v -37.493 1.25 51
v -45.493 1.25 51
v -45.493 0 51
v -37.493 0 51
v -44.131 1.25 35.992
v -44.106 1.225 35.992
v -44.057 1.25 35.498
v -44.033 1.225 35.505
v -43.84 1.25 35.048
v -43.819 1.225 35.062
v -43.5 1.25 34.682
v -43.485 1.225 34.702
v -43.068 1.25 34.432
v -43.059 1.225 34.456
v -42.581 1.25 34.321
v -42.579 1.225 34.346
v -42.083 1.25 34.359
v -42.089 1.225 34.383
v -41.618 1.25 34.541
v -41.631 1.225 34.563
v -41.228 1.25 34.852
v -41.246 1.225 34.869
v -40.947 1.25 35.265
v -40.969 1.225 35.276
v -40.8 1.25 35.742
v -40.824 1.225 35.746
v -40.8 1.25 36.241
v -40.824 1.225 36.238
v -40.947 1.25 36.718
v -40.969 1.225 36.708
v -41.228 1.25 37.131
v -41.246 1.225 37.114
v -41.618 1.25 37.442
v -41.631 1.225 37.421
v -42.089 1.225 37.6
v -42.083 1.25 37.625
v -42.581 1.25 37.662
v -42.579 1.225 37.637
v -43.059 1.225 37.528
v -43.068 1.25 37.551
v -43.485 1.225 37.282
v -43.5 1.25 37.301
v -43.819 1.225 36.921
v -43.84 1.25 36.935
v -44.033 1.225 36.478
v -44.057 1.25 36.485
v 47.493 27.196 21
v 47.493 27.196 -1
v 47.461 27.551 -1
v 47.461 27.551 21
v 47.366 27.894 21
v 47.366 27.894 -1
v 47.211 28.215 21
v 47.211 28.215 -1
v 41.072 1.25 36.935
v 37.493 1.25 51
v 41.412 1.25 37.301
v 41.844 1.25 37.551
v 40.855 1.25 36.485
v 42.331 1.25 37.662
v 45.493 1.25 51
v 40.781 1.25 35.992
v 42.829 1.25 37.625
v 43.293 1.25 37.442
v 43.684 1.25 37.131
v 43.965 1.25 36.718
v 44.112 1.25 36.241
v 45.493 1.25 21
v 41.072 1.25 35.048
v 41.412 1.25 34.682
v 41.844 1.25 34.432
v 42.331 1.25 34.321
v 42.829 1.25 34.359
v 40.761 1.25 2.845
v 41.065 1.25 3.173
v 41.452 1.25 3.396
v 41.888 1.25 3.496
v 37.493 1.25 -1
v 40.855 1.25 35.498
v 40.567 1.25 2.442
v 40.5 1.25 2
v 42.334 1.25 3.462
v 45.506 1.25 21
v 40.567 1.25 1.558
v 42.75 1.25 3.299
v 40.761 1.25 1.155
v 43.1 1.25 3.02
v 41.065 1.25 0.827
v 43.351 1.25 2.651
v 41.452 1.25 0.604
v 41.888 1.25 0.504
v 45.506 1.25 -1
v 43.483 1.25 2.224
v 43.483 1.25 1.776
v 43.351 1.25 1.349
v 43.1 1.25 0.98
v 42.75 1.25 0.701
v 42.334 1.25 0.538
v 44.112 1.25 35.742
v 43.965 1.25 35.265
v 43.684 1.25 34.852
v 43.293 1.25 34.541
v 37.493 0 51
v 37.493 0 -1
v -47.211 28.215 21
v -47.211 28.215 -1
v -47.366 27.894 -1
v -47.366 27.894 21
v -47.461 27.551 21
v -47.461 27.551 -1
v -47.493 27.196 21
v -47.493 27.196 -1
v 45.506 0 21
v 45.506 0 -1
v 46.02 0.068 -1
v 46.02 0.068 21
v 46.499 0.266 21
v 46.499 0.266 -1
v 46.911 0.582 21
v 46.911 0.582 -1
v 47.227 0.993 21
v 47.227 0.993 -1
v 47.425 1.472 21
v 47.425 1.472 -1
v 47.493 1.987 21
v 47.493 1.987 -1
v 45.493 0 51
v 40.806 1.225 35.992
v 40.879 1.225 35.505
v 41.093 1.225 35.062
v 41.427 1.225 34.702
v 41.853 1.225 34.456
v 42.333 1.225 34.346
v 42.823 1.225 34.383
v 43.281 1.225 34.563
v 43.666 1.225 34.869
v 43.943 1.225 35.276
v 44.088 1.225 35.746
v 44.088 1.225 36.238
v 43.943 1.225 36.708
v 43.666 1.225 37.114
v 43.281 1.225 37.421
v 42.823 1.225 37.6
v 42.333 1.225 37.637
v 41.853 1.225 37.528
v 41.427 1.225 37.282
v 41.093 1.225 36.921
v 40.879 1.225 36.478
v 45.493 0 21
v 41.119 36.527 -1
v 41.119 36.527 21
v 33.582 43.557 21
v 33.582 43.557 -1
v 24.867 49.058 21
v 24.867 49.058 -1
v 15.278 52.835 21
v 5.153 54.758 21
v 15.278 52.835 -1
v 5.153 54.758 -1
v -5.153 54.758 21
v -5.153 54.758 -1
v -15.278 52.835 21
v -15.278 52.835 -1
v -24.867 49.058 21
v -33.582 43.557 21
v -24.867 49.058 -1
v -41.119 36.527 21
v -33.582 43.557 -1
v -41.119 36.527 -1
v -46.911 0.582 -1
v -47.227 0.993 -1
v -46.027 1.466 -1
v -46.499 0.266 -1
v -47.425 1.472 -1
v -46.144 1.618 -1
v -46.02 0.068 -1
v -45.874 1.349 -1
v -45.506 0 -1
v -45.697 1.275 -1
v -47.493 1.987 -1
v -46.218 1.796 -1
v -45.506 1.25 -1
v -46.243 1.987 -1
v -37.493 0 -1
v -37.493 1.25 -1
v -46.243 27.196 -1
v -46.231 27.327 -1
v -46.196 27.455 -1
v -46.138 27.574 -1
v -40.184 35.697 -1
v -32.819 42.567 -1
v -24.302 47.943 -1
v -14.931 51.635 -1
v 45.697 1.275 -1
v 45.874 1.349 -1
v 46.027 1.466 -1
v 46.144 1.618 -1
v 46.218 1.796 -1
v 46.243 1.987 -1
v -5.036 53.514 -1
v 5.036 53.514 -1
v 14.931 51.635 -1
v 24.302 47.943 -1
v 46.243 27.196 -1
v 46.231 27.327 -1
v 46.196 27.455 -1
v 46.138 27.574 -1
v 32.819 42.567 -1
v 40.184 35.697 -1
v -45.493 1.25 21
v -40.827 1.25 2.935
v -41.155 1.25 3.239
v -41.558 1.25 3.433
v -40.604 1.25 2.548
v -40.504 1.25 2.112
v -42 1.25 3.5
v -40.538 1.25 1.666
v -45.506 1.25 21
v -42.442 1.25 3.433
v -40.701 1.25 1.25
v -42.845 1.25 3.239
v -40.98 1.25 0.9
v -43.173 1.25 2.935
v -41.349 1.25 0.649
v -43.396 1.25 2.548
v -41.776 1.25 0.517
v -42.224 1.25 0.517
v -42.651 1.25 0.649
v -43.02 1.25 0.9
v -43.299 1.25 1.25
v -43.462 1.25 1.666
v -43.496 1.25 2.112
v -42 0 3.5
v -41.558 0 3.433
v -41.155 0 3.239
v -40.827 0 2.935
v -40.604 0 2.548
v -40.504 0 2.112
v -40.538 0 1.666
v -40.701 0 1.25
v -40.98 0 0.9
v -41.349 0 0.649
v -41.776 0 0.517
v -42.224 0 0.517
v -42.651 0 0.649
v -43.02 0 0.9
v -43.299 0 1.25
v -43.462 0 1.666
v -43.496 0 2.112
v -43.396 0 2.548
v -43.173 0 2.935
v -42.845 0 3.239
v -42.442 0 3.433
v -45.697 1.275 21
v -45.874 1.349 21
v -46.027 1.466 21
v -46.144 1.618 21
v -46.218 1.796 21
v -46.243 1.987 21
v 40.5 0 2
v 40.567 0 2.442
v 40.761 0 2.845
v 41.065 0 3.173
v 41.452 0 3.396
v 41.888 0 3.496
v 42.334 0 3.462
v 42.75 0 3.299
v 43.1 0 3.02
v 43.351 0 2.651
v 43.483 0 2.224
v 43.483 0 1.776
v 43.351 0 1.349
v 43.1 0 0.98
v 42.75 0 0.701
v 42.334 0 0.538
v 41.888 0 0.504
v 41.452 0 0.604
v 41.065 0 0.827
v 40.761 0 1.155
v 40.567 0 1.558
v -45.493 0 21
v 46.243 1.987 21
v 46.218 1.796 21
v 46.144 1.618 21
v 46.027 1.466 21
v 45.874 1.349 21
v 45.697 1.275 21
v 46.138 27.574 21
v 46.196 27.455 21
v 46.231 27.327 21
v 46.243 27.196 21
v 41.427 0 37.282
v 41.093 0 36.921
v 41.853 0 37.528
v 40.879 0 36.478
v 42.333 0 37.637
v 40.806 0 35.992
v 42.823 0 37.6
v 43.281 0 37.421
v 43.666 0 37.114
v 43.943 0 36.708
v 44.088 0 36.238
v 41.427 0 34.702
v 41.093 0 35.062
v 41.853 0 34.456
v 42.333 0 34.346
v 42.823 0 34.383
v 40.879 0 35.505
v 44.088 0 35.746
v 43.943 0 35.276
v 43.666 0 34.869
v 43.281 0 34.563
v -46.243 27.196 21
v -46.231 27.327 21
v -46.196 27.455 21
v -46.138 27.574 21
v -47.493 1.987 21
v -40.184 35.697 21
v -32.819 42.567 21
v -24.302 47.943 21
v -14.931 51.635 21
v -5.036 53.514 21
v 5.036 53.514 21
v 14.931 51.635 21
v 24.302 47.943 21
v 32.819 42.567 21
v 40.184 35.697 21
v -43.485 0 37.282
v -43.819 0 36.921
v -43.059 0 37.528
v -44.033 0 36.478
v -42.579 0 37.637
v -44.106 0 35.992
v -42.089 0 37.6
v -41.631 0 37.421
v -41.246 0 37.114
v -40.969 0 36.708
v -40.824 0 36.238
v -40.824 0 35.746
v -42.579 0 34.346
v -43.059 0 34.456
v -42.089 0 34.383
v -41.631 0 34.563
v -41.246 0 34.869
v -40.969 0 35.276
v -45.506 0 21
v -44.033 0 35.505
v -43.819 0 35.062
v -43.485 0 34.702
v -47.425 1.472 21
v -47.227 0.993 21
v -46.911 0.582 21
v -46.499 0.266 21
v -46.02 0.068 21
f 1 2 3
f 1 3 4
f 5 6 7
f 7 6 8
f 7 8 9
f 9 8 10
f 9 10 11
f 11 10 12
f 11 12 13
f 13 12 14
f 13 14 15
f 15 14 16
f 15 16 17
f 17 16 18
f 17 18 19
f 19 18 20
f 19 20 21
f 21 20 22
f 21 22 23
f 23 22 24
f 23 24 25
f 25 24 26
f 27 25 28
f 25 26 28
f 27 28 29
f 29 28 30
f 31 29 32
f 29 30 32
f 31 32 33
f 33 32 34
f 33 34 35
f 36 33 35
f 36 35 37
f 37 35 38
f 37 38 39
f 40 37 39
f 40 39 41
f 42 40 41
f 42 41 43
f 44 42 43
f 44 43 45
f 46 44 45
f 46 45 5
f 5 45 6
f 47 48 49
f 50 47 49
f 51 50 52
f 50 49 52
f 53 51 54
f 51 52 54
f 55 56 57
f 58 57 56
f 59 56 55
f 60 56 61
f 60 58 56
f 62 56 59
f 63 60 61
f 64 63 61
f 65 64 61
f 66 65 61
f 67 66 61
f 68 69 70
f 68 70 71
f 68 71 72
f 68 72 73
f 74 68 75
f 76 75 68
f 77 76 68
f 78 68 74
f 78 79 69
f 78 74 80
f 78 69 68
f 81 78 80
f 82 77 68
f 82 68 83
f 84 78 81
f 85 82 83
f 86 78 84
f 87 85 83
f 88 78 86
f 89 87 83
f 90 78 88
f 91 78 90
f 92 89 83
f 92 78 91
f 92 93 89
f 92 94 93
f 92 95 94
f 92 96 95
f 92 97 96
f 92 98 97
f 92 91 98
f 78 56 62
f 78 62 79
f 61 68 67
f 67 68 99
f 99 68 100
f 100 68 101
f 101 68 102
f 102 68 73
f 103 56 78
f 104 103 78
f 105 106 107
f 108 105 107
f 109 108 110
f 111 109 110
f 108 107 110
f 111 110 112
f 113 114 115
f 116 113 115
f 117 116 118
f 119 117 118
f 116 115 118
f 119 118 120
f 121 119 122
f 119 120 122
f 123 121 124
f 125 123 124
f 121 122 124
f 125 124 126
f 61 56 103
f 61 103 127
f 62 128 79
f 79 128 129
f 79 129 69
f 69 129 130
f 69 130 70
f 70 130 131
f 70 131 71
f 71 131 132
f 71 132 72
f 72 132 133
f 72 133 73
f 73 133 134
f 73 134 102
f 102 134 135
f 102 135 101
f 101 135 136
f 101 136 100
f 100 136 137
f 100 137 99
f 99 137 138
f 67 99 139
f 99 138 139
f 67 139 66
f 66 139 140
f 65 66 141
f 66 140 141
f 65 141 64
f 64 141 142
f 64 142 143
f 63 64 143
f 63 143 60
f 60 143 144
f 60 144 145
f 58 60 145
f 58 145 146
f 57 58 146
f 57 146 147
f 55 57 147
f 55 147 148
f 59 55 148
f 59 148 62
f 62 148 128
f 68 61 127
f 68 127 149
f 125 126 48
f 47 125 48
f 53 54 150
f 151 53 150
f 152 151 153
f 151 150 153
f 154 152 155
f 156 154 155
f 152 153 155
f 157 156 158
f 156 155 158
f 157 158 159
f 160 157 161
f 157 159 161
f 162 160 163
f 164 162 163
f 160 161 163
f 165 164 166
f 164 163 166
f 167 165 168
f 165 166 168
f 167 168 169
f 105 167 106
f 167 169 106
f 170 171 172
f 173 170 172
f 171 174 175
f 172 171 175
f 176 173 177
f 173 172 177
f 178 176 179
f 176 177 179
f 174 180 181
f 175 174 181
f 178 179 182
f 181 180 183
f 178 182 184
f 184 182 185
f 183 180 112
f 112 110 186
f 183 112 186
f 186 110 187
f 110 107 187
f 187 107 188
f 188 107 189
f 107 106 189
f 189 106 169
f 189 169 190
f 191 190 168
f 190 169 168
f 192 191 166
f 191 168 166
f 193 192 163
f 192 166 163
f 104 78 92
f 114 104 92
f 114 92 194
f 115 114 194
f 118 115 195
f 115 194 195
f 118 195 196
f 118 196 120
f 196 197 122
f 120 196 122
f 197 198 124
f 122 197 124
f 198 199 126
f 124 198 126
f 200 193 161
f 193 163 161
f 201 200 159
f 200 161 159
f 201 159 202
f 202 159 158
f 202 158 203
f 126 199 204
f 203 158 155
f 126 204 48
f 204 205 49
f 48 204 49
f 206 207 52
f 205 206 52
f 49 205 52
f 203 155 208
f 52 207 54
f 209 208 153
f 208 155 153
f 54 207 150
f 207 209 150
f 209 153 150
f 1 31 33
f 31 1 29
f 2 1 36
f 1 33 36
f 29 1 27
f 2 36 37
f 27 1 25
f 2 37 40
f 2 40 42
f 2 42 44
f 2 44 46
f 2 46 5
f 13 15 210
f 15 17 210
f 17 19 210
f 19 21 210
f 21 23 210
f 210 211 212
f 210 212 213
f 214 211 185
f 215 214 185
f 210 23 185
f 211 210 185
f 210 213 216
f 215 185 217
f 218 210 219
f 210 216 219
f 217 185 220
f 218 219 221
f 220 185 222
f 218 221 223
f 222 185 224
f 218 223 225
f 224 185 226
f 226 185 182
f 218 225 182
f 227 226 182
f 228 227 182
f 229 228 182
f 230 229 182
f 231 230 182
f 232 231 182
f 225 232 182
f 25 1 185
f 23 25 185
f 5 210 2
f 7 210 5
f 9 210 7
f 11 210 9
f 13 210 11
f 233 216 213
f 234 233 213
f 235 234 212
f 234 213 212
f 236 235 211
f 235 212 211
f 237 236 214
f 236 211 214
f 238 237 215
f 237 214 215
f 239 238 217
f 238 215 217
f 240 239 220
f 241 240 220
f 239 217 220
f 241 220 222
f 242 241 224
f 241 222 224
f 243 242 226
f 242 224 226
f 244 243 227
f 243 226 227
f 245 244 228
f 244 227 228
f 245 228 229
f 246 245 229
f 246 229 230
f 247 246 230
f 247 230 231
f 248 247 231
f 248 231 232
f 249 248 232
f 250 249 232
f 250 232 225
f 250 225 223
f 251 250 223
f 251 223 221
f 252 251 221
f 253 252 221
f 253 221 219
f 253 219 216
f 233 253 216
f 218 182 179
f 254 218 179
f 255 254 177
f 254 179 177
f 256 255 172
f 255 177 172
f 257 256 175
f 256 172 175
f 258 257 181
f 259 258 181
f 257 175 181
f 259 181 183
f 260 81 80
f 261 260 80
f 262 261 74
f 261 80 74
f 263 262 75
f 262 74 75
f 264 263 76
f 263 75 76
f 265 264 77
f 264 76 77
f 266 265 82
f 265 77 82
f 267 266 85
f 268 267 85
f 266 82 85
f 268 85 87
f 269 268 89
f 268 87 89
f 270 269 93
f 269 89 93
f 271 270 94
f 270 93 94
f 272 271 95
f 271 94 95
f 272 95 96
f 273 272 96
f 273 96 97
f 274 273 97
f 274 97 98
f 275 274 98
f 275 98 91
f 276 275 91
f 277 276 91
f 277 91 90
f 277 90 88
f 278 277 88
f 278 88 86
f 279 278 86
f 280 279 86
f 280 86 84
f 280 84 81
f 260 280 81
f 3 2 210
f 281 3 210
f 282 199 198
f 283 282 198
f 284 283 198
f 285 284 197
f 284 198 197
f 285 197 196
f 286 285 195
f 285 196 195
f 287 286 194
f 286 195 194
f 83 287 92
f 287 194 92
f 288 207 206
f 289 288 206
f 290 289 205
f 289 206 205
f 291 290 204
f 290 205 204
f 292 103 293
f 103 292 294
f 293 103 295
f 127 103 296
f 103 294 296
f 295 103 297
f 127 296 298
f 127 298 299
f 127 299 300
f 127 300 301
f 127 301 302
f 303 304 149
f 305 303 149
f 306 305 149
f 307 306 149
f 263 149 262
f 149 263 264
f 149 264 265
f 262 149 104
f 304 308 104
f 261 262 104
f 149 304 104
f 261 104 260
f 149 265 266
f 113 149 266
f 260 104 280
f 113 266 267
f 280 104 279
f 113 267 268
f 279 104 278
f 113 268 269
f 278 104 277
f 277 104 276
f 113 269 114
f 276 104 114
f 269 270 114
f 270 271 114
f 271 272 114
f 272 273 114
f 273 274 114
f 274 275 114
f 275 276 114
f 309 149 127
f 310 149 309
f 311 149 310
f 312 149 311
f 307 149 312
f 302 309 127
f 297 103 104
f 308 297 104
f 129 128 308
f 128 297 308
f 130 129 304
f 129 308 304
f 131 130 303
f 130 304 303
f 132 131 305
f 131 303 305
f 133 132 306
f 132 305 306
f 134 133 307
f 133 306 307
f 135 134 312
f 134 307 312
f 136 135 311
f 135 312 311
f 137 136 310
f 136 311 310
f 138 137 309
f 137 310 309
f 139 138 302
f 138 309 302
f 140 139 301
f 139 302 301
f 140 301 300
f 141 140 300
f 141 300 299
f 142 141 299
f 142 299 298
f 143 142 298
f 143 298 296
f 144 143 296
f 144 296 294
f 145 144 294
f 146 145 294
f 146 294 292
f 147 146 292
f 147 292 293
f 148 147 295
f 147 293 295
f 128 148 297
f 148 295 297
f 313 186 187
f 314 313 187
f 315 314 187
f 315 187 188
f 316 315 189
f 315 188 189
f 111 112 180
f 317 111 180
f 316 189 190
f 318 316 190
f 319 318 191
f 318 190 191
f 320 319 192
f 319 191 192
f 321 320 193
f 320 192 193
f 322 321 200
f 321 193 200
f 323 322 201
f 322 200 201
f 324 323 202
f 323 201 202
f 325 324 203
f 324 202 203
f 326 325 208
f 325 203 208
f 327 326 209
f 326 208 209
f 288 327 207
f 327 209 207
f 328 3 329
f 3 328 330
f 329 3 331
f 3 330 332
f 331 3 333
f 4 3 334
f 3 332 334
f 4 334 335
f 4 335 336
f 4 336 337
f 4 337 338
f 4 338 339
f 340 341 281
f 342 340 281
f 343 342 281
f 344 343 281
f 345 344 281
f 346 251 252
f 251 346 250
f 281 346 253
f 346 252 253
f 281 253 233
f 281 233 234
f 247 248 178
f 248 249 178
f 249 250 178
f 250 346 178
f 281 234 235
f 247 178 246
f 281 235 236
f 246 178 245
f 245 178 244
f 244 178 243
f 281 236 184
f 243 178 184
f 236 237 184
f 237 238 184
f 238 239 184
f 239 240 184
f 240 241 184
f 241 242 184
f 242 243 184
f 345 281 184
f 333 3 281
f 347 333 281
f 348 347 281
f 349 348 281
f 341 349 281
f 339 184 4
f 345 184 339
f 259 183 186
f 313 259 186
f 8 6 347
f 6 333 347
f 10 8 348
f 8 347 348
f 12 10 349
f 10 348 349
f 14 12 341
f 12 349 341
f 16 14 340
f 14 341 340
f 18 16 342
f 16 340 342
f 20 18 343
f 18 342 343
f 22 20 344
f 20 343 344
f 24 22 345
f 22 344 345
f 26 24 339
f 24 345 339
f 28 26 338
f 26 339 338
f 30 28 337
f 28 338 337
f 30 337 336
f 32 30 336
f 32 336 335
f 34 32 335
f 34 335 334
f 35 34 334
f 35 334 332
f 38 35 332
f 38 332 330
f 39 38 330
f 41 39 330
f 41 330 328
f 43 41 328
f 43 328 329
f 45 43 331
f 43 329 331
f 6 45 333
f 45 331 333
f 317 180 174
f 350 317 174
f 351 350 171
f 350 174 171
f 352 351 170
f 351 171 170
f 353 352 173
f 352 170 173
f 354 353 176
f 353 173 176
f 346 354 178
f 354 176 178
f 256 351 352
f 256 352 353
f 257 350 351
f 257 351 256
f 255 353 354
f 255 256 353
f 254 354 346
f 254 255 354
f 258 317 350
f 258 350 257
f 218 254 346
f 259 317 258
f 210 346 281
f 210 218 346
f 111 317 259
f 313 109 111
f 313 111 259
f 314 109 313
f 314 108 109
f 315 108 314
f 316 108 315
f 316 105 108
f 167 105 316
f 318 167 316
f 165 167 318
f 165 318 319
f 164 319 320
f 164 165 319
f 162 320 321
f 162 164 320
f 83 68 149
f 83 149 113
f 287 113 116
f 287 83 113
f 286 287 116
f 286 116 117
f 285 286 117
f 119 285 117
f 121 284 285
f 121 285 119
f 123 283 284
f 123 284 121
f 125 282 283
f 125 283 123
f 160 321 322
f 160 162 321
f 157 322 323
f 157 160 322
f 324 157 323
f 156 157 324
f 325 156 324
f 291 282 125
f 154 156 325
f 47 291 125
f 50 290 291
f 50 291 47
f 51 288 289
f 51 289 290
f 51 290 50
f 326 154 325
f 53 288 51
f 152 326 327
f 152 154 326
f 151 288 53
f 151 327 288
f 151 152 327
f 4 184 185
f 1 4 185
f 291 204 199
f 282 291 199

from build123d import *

# Parameters (mm, degrees)
BASE_FLANGE1_START                    = -1
BASE_FLANGE1_DEPTH                    = 22
SKETCH37_W                            = 8
SKETCH37_H                            = 30
BOSS_EXTRUDE1_DEPTH                   = 1.25
TAP_DRILL_FOR_M4X0_7_TAP1_D           = 3.3
TAP_DRILL_FOR_M4X0_7_TAP1_DEPTH       = 10
TAP_DRILL_FOR_M4X0_7_TAP1_CSINK_D     = 3.35
TAP_DRILL_FOR_M4X0_7_TAP1_CSINK_ANGLE = 90
TAP_DRILL_FOR_M4X0_7_TAP1_TIP         = 0.991420021
SKETCH36_R                            = 1.5
CUT_EXTRUDE1_DEPTH                    = 10


# Read off the part's stored shape, not the designer's step: Base-Flange1
with BuildPart() as part:
    # Base-Flange1 outline → Base-Flange1 (new body)
    with BuildSketch(Plane.XY.offset(BASE_FLANGE1_START)):
        with BuildLine():
            Line((-45.506078027, 0), (-37.492678027, 0))
            Line((-37.492678027, 0), (-37.492678027, 1.25))
            Line((-37.492678027, 1.25), (-45.506078027, 1.25))
            ThreePointArc((-45.506078027, 1.25), (-46.026932882, 1.465745145), (-46.242678027, 1.9866))
            Line((-46.242678027, 1.9866), (-46.242678027, 27.195908555))
            ThreePointArc((-46.242678027, 27.195908555), (-46.216121498, 27.391913221), (-46.138366789, 27.573784833))
            ThreePointArc((-46.138366789, 27.573784833), (0, 53.75), (46.138366789, 27.573784833))
            ThreePointArc((46.138366789, 27.573784833), (46.216121498, 27.391913221), (46.242678027, 27.195908555))
            Line((46.242678027, 27.195908555), (46.242678027, 1.9866))
            ThreePointArc((46.242678027, 1.9866), (46.026932882, 1.465745145), (45.506078027, 1.25))
            Line((45.506078027, 1.25), (37.492678027, 1.25))
            Line((37.492678027, 1.25), (37.492678027, 0))
            Line((37.492678027, 0), (45.506078027, 0))
            ThreePointArc((45.506078027, 0), (46.910816359, 0.581861668), (47.492678027, 1.9866))
            Line((47.492678027, 1.9866), (47.492678027, 27.195908555))
            ThreePointArc((47.492678027, 27.195908555), (47.421055437, 27.724530423), (47.211352064, 28.215035643))
            ThreePointArc((47.211352064, 28.215035643), (0, 55), (-47.211352064, 28.215035643))
            ThreePointArc((-47.211352064, 28.215035643), (-47.421055437, 27.724530423), (-47.492678027, 27.195908555))
            Line((-47.492678027, 27.195908555), (-47.492678027, 1.9866))
            ThreePointArc((-47.492678027, 1.9866), (-46.910816359, 0.581861668), (-45.506078027, 0))
        make_face()
    extrude(amount=BASE_FLANGE1_DEPTH)

    # Sketch37 → Boss-Extrude1 (add)
    with BuildSketch(Plane(origin=(0, 1.25, 0), x_dir=(1, 0, 0), z_dir=(0, 1, 0))):
        with Locations((41.492678027, -36)):
            Rectangle(SKETCH37_W, SKETCH37_H)
        with Locations((-41.492678027, -36)):
            Rectangle(SKETCH37_W, SKETCH37_H)
    extrude(amount=-BOSS_EXTRUDE1_DEPTH)

    # Tap Drill for M4x0.7 Tap1
    with Locations(Plane(origin=(0, 1.25, 0), x_dir=(1, 0, 0), z_dir=(0, 1, 0))):
        with Locations((-42.455982414, -35.991709022), (42.455982414, -35.991709022)):
            CounterSinkHole(TAP_DRILL_FOR_M4X0_7_TAP1_D / 2, TAP_DRILL_FOR_M4X0_7_TAP1_CSINK_D / 2, depth=TAP_DRILL_FOR_M4X0_7_TAP1_DEPTH, counter_sink_angle=TAP_DRILL_FOR_M4X0_7_TAP1_CSINK_ANGLE)
            with Locations((0, 0, -(TAP_DRILL_FOR_M4X0_7_TAP1_DEPTH + TAP_DRILL_FOR_M4X0_7_TAP1_TIP / 2))):  # 118° drill point
                Cone(0, TAP_DRILL_FOR_M4X0_7_TAP1_D / 2, TAP_DRILL_FOR_M4X0_7_TAP1_TIP, mode=Mode.SUBTRACT)

    # Sketch36 → Cut-Extrude1 (cut)
    with BuildSketch(Plane(origin=(0, 1.25, 0), x_dir=(1, 0, 0), z_dir=(0, 1, 0))):
        with Locations(Location((42.000000004, -2, 0), (0, 0, 180))):
            Circle(SKETCH36_R)
        with Locations(Location((-42.000000004, -2, 0), (0, 0, 270))):
            Circle(SKETCH36_R)
    extrude(amount=-CUT_EXTRUDE1_DEPTH, mode=Mode.SUBTRACT)


solid = part.part
